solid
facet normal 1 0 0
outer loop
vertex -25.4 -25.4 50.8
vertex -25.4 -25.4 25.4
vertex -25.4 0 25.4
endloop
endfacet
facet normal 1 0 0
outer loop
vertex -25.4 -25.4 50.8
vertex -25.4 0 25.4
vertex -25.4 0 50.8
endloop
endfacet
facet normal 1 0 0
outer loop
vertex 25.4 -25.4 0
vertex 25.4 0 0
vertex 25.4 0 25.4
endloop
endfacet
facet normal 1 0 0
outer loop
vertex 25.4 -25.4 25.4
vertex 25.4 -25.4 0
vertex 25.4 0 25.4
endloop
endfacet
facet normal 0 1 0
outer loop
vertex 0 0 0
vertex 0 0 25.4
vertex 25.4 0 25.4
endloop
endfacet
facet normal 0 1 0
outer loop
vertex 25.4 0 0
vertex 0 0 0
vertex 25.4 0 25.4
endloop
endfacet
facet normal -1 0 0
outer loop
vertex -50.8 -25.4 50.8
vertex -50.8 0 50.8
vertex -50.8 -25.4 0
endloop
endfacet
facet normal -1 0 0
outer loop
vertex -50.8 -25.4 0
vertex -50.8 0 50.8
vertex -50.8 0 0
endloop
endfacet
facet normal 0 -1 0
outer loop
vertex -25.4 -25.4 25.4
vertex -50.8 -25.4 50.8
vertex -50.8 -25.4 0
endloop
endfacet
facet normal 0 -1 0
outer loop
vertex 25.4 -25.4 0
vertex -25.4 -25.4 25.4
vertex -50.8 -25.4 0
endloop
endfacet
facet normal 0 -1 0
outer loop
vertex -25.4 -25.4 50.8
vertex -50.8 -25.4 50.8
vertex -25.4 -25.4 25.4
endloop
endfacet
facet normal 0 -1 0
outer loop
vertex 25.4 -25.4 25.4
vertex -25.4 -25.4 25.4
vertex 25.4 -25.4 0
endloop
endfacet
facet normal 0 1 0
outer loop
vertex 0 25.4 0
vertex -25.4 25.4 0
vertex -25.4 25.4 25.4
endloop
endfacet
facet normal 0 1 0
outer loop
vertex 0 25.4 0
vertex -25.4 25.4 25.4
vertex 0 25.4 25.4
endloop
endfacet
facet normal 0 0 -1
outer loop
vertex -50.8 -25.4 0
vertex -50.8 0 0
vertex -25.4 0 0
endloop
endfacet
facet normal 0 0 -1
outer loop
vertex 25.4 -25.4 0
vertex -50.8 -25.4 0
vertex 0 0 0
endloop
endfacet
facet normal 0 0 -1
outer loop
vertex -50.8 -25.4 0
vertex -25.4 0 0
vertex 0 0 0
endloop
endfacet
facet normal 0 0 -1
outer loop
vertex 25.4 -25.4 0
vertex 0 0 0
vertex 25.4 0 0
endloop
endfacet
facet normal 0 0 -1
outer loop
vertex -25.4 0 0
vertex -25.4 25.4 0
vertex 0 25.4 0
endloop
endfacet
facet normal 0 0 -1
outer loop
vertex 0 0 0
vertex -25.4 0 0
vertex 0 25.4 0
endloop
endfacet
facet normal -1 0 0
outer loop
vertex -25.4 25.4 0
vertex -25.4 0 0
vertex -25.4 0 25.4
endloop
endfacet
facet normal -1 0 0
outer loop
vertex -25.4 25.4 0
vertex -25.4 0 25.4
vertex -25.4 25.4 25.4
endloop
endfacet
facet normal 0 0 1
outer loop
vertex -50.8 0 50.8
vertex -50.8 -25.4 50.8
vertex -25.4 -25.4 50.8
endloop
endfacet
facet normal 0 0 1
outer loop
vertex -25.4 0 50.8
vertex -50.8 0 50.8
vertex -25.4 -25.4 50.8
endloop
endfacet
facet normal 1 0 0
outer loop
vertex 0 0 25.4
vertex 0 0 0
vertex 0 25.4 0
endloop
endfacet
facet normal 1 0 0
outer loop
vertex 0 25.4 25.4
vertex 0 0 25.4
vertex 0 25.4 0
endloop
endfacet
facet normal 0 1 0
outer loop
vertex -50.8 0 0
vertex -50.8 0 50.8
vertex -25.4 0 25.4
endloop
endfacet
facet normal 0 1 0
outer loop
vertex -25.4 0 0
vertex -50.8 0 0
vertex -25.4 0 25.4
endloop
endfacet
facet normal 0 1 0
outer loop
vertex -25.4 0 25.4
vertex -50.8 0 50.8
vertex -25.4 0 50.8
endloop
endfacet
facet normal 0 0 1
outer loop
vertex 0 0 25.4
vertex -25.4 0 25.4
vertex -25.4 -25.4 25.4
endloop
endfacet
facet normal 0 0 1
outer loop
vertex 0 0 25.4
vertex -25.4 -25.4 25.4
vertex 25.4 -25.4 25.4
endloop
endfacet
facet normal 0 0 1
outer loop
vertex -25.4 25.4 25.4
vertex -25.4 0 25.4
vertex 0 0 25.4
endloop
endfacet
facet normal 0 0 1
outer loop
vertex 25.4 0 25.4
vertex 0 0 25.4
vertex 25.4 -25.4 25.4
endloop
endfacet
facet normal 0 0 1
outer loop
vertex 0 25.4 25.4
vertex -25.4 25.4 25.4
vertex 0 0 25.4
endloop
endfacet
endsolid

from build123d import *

# Parameters (mm, degrees)
F0_W     = 25.4
F0_H     = 25.4
F1_DEPTH = 25.4
F2_W     = 25.4
F2_H     = 25.4
F3_DEPTH = 25.4


with BuildPart() as f1:
    # F0 (on Front) → F1 (new body)
    with BuildSketch(Plane.XZ):
        with Locations((-38.1, 12.7)):
            Rectangle(F0_W, F0_H)
        with Locations((-12.7, 12.7)):
            Rectangle(F0_W, F0_H)
        with Locations((12.7, 12.7)):
            Rectangle(F0_W, F0_H)
        with Locations((-38.1, 38.1)):
            Rectangle(F0_W, F0_H)
    extrude(amount=F1_DEPTH)

    # F2 (on Top) → F3 (join)
    with BuildSketch(Plane.XY):
        with Locations((-12.7, 12.7)):
            Rectangle(F2_W, F2_H)
    extrude(amount=F3_DEPTH)


solid = f1.part
